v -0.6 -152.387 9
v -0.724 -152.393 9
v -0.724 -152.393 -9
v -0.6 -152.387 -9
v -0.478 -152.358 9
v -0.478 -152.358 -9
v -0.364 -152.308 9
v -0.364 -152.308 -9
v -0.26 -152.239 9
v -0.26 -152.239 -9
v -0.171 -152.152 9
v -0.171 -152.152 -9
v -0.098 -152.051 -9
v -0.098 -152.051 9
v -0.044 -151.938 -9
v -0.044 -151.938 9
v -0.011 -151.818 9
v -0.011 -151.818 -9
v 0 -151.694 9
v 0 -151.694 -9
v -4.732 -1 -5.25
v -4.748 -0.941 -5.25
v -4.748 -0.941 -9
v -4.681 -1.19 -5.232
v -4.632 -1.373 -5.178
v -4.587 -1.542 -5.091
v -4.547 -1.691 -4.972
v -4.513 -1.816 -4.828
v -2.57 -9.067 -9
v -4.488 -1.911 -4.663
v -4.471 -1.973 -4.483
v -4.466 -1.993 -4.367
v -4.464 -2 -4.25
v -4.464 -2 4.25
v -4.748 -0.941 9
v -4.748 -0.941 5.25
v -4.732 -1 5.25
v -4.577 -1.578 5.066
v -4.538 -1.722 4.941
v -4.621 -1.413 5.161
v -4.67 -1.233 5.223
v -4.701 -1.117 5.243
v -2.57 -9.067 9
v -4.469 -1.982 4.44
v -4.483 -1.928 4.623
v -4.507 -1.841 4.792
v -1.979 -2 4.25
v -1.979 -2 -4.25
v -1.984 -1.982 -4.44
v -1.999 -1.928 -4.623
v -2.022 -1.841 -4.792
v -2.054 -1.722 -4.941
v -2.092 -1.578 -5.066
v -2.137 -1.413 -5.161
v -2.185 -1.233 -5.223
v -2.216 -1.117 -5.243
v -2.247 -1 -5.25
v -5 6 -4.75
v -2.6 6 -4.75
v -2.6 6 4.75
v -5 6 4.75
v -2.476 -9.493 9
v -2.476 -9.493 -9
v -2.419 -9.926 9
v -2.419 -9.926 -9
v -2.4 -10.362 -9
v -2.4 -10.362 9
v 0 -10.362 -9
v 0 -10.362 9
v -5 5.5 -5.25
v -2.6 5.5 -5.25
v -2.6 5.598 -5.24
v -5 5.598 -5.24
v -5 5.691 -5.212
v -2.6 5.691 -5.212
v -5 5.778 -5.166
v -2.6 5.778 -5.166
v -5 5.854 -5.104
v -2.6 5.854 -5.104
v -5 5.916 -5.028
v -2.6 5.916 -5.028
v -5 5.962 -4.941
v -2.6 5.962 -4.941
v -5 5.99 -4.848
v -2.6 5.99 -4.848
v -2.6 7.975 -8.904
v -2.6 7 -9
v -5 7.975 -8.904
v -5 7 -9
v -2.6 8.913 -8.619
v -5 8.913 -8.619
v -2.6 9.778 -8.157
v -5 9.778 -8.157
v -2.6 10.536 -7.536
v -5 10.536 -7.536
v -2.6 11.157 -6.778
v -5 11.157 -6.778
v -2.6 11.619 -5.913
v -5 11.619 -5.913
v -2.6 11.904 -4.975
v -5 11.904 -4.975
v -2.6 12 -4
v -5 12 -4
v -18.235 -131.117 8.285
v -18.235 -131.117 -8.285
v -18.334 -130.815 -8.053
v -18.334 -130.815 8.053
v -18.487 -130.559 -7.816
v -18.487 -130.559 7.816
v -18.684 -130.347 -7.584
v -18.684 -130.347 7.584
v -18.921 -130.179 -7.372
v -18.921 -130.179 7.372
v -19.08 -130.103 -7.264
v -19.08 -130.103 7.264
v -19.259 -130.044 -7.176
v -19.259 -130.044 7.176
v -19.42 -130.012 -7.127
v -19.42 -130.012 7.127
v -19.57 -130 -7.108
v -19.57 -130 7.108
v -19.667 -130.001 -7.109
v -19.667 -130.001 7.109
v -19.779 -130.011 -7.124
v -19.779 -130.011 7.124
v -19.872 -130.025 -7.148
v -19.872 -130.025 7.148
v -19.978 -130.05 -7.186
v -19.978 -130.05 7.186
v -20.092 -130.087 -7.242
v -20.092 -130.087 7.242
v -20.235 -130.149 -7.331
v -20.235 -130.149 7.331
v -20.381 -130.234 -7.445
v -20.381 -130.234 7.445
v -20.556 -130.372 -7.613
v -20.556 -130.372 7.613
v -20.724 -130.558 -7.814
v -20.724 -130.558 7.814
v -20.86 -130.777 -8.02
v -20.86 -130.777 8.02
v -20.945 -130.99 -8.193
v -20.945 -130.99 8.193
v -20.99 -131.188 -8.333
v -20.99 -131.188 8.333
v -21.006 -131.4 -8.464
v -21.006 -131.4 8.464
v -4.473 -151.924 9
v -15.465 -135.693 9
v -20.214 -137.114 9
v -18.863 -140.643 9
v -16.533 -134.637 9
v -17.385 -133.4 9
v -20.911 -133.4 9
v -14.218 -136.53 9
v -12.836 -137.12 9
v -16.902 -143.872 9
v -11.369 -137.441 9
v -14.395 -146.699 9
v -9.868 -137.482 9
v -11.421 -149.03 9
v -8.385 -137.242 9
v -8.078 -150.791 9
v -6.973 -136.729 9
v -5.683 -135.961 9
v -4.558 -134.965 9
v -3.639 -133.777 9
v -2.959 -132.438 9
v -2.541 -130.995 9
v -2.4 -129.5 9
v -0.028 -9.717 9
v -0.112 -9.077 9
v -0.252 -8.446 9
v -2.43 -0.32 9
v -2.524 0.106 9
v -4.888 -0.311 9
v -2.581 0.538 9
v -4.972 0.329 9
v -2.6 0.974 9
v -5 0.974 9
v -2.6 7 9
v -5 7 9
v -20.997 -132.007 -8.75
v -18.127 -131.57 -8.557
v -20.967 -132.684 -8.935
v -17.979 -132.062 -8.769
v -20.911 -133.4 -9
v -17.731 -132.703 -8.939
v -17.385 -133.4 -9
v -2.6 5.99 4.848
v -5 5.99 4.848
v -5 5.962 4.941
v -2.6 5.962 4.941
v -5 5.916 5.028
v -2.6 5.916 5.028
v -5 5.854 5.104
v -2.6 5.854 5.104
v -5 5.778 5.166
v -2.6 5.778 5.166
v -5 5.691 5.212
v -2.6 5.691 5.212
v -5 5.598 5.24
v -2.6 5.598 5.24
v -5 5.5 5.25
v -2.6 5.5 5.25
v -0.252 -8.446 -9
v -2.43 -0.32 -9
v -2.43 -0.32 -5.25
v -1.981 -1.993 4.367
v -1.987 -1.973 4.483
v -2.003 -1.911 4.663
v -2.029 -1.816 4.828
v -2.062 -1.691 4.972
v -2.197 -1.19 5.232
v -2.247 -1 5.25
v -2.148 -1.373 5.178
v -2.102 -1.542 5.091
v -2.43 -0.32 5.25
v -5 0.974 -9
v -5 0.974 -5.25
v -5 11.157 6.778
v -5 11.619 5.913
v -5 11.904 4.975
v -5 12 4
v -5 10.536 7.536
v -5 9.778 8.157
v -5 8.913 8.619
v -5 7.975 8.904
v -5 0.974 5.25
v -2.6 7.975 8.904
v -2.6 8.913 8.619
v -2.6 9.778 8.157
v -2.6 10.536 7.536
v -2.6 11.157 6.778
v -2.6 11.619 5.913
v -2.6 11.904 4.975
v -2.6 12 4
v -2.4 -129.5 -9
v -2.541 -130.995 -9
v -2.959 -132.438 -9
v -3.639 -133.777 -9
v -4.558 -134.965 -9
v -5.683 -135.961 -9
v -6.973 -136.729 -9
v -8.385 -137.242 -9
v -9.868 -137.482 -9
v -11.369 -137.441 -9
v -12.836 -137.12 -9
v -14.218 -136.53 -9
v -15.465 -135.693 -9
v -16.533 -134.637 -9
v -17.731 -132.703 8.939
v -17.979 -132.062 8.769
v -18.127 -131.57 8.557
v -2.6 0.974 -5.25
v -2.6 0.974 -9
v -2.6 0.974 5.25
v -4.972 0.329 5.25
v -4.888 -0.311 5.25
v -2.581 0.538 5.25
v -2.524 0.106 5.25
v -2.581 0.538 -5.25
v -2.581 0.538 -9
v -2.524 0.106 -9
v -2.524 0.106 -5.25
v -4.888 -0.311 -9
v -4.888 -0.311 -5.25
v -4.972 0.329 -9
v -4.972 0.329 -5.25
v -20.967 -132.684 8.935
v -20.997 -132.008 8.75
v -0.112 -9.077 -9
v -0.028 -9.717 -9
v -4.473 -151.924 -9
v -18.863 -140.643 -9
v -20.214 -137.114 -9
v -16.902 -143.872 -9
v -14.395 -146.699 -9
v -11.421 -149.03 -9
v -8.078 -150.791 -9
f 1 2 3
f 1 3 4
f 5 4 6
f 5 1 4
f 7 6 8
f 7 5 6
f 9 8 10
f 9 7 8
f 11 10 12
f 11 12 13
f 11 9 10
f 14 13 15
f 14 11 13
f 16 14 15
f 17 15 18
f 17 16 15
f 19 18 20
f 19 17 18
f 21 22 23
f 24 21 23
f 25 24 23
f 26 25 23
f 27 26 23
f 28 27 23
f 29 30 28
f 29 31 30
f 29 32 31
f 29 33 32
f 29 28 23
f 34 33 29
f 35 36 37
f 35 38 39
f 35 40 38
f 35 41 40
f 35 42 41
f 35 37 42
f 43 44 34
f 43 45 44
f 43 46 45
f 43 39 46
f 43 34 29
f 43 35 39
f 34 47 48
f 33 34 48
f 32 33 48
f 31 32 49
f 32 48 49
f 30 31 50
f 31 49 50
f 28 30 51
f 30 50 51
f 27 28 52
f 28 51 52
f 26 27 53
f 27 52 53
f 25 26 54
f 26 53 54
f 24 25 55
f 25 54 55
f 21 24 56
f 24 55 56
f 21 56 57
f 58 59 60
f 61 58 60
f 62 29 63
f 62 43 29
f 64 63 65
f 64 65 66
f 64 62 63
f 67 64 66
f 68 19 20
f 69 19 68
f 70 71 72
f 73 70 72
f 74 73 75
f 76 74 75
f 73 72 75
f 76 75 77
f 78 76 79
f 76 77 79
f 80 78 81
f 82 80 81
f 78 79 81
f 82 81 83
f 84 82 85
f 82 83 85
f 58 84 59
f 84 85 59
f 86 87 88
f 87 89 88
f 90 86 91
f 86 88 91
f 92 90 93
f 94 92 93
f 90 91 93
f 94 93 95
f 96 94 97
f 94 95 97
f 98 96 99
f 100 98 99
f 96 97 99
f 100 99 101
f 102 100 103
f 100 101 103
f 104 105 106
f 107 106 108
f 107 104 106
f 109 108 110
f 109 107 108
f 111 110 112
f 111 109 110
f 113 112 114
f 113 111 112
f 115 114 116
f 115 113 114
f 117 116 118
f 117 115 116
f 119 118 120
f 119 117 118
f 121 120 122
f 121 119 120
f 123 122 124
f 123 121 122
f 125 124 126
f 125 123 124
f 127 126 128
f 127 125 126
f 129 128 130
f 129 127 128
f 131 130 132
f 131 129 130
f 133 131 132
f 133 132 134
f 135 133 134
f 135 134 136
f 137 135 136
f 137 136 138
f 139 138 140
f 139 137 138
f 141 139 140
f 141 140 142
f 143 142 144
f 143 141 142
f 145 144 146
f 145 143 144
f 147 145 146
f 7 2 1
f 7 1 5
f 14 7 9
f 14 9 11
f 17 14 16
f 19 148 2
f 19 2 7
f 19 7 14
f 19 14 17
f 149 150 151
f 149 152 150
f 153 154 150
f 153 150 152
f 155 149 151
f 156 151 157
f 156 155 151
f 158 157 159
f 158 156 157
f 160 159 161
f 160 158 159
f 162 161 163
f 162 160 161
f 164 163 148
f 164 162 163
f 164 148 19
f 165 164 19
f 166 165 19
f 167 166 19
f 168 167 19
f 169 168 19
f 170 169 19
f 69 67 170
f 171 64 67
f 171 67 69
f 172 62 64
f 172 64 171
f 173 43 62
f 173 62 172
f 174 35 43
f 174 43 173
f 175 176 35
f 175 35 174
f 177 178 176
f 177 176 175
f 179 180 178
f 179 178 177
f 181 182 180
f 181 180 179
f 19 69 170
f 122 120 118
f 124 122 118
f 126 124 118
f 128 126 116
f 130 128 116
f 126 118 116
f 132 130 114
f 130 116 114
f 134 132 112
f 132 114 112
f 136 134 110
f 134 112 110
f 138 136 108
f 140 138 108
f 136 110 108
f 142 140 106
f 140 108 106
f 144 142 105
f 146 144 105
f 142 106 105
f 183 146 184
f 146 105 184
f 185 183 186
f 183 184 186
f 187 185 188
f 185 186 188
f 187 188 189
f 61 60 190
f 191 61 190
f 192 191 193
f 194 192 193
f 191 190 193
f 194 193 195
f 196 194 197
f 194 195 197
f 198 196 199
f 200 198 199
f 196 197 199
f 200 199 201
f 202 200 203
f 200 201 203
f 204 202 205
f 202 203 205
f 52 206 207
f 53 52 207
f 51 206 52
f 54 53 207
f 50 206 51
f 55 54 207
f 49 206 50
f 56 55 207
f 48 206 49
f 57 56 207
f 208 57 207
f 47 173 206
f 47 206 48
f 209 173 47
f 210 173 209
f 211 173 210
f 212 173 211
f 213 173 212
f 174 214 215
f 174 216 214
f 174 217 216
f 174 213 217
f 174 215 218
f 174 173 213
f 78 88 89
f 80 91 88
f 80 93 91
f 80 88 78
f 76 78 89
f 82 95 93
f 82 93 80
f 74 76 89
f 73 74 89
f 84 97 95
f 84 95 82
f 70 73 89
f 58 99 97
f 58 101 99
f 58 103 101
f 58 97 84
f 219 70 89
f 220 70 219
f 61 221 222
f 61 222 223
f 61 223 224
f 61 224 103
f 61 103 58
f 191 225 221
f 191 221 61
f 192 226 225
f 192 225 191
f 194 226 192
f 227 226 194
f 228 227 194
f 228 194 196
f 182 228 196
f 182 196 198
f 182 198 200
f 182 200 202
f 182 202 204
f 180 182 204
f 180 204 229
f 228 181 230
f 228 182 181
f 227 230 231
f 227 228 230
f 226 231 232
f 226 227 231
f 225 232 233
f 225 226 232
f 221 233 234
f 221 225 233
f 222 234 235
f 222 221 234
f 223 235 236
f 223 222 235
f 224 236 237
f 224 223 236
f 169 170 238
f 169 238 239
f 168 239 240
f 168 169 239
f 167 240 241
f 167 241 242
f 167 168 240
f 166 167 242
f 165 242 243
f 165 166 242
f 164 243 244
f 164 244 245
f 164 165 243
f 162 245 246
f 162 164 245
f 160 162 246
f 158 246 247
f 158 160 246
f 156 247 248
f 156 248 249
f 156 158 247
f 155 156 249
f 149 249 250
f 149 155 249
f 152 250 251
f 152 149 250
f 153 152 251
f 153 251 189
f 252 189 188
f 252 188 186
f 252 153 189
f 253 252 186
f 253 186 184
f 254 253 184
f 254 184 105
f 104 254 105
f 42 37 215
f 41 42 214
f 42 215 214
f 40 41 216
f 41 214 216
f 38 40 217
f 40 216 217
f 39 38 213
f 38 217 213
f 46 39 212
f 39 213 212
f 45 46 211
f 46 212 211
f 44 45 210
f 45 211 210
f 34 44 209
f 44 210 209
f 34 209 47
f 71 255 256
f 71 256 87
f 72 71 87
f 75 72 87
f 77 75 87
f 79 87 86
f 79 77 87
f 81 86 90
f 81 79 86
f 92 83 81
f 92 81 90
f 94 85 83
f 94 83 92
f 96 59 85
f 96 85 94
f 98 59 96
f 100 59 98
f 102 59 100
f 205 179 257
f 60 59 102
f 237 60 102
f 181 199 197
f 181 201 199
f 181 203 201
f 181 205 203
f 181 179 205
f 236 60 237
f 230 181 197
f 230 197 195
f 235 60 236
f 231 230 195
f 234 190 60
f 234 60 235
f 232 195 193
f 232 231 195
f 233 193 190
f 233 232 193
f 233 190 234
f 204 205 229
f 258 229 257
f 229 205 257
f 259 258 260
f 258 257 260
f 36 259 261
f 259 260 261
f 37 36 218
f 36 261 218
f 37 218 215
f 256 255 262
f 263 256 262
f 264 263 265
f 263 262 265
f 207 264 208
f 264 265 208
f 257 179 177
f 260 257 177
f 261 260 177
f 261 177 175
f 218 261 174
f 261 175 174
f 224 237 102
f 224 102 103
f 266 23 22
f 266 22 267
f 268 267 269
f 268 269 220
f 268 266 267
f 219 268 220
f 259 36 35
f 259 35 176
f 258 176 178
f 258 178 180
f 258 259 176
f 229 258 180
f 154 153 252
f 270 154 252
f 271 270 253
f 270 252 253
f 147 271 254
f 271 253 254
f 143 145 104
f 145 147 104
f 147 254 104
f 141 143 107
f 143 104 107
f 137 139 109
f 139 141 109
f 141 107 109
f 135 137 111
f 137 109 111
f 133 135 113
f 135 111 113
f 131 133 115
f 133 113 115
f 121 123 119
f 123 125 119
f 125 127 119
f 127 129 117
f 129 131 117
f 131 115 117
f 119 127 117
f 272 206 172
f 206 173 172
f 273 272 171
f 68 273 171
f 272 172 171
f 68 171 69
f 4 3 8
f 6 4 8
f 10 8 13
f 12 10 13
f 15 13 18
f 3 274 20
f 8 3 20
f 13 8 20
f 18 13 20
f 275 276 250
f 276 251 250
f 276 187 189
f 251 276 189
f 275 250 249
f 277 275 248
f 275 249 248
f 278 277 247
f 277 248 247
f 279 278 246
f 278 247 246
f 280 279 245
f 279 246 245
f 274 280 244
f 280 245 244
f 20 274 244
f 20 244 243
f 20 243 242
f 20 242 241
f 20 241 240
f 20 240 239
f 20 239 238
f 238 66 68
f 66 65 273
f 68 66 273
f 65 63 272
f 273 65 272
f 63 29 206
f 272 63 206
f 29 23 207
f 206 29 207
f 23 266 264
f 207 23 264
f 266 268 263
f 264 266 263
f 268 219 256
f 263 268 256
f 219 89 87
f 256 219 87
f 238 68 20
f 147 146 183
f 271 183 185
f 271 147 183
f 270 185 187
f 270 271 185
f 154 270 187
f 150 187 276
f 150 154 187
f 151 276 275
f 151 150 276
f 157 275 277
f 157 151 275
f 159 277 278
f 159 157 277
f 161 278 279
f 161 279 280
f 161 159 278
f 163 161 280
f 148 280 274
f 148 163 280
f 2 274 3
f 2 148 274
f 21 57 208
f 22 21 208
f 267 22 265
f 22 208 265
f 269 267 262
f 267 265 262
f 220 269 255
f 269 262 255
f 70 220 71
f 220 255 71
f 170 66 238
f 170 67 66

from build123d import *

# Parameters (mm, degrees)
F1_DEPTH = 9
F2_R     = 5
F3_R     = 7.4
F5_START = -10
F5_DEPTH = 20
F7_DEPTH = 15
F8_R     = 5


with BuildPart() as f1:
    # F0 (on Top) → F1 (new body, symmetric)
    with BuildSketch(Plane.XY):
        with BuildLine():
            Line((-5, 0), (-2.4, -9.7033320997))
            Line((-2.4, -9.7033320997), (-2.4, -129.5))
            ThreePointArc((-2.4, -129.5), (-9.5872847082, -137.4586113019), (-18.2348734636, -131.1170212766))
            ThreePointArc((-18.2348734636, -131.1170212766), (-19.7482014958, -130.0072430222), (-21.0059763198, -131.4))
            ThreePointArc((-21.0059763198, -131.4), (-15.1073180305, -145.995204112), (-0.7241308269, -152.3934912697))
            ThreePointArc((-0.7241308269, -152.3934912697), (-0.2136316102, -152.1973413167), (0, -151.6939073197))
            Line((0, -151.6939073197), (0, -9.3873661055))
            Line((0, -9.3873661055), (-2.6, 0.3159659942))
            Line((-2.6, 0.3159659942), (-2.6, 12))
            Line((-2.6, 12), (-5, 12))
            Line((-5, 12), (-5, 0))
        make_face()
    extrude(amount=F1_DEPTH, both=True)

    # F2
    f2_edges = [f1.edges().sort_by_distance(p)[0] for p in [
        (-2.4, -9.703332, 0),
        (-2.6, 0.315966, 0),
    ]]
    fillet(f2_edges, radius=F2_R)

    # F3
    f3_edges = [f1.edges().sort_by_distance(p)[0] for p in [
        (-5, 0, 0),
        (0, -9.387366, 0),
    ]]
    fillet(f3_edges, radius=F3_R)

    # F4 (on Right) → F5 (cut)
    with BuildSketch(Plane.YZ.offset(F5_START)):
        with BuildLine():
            ThreePointArc((-129.4, -5), (-130.5715728753, -7.8284271247), (-133.4, -9))
            Line((-133.4, -9), (-133.4, -10))
            Line((-133.4, -10), (-128.4, -10))
            Line((-128.4, -10), (-128.4, 10))
            Line((-128.4, 10), (-133.4, 10))
            Line((-133.4, 10), (-133.4, 9))
            ThreePointArc((-133.4, 9), (-130.5715728753, 7.8284271247), (-129.4, 5))
            Line((-129.4, 5), (-129.4, -5))
        make_face()
    extrude(amount=-F5_DEPTH, mode=Mode.SUBTRACT)

    # F6 (on Right) → F7 (cut)
    with BuildSketch(Plane.YZ):
        with BuildLine():
            ThreePointArc((5.5, -5.25), (5.8535533906, -5.1035533906), (6, -4.75))
            Line((6, -4.75), (6, 4.75))
            ThreePointArc((6, 4.75), (5.8535533906, 5.1035533906), (5.5, 5.25))
            Line((5.5, 5.25), (-1, 5.25))
            ThreePointArc((-1, 5.25), (-1.7071067812, 4.9571067812), (-2, 4.25))
            Line((-2, 4.25), (-2, -4.25))
            ThreePointArc((-2, -4.25), (-1.7071067812, -4.9571067812), (-1, -5.25))
            Line((-1, -5.25), (5.5, -5.25))
        make_face()
    extrude(amount=-F7_DEPTH, mode=Mode.SUBTRACT)

    # F8
    f8_edges = [f1.edges().sort_by_distance(p)[0] for p in [
        (-3.8, 12, -9),
        (-3.8, 12, 9),
    ]]
    fillet(f8_edges, radius=F8_R)


solid = f1.part
